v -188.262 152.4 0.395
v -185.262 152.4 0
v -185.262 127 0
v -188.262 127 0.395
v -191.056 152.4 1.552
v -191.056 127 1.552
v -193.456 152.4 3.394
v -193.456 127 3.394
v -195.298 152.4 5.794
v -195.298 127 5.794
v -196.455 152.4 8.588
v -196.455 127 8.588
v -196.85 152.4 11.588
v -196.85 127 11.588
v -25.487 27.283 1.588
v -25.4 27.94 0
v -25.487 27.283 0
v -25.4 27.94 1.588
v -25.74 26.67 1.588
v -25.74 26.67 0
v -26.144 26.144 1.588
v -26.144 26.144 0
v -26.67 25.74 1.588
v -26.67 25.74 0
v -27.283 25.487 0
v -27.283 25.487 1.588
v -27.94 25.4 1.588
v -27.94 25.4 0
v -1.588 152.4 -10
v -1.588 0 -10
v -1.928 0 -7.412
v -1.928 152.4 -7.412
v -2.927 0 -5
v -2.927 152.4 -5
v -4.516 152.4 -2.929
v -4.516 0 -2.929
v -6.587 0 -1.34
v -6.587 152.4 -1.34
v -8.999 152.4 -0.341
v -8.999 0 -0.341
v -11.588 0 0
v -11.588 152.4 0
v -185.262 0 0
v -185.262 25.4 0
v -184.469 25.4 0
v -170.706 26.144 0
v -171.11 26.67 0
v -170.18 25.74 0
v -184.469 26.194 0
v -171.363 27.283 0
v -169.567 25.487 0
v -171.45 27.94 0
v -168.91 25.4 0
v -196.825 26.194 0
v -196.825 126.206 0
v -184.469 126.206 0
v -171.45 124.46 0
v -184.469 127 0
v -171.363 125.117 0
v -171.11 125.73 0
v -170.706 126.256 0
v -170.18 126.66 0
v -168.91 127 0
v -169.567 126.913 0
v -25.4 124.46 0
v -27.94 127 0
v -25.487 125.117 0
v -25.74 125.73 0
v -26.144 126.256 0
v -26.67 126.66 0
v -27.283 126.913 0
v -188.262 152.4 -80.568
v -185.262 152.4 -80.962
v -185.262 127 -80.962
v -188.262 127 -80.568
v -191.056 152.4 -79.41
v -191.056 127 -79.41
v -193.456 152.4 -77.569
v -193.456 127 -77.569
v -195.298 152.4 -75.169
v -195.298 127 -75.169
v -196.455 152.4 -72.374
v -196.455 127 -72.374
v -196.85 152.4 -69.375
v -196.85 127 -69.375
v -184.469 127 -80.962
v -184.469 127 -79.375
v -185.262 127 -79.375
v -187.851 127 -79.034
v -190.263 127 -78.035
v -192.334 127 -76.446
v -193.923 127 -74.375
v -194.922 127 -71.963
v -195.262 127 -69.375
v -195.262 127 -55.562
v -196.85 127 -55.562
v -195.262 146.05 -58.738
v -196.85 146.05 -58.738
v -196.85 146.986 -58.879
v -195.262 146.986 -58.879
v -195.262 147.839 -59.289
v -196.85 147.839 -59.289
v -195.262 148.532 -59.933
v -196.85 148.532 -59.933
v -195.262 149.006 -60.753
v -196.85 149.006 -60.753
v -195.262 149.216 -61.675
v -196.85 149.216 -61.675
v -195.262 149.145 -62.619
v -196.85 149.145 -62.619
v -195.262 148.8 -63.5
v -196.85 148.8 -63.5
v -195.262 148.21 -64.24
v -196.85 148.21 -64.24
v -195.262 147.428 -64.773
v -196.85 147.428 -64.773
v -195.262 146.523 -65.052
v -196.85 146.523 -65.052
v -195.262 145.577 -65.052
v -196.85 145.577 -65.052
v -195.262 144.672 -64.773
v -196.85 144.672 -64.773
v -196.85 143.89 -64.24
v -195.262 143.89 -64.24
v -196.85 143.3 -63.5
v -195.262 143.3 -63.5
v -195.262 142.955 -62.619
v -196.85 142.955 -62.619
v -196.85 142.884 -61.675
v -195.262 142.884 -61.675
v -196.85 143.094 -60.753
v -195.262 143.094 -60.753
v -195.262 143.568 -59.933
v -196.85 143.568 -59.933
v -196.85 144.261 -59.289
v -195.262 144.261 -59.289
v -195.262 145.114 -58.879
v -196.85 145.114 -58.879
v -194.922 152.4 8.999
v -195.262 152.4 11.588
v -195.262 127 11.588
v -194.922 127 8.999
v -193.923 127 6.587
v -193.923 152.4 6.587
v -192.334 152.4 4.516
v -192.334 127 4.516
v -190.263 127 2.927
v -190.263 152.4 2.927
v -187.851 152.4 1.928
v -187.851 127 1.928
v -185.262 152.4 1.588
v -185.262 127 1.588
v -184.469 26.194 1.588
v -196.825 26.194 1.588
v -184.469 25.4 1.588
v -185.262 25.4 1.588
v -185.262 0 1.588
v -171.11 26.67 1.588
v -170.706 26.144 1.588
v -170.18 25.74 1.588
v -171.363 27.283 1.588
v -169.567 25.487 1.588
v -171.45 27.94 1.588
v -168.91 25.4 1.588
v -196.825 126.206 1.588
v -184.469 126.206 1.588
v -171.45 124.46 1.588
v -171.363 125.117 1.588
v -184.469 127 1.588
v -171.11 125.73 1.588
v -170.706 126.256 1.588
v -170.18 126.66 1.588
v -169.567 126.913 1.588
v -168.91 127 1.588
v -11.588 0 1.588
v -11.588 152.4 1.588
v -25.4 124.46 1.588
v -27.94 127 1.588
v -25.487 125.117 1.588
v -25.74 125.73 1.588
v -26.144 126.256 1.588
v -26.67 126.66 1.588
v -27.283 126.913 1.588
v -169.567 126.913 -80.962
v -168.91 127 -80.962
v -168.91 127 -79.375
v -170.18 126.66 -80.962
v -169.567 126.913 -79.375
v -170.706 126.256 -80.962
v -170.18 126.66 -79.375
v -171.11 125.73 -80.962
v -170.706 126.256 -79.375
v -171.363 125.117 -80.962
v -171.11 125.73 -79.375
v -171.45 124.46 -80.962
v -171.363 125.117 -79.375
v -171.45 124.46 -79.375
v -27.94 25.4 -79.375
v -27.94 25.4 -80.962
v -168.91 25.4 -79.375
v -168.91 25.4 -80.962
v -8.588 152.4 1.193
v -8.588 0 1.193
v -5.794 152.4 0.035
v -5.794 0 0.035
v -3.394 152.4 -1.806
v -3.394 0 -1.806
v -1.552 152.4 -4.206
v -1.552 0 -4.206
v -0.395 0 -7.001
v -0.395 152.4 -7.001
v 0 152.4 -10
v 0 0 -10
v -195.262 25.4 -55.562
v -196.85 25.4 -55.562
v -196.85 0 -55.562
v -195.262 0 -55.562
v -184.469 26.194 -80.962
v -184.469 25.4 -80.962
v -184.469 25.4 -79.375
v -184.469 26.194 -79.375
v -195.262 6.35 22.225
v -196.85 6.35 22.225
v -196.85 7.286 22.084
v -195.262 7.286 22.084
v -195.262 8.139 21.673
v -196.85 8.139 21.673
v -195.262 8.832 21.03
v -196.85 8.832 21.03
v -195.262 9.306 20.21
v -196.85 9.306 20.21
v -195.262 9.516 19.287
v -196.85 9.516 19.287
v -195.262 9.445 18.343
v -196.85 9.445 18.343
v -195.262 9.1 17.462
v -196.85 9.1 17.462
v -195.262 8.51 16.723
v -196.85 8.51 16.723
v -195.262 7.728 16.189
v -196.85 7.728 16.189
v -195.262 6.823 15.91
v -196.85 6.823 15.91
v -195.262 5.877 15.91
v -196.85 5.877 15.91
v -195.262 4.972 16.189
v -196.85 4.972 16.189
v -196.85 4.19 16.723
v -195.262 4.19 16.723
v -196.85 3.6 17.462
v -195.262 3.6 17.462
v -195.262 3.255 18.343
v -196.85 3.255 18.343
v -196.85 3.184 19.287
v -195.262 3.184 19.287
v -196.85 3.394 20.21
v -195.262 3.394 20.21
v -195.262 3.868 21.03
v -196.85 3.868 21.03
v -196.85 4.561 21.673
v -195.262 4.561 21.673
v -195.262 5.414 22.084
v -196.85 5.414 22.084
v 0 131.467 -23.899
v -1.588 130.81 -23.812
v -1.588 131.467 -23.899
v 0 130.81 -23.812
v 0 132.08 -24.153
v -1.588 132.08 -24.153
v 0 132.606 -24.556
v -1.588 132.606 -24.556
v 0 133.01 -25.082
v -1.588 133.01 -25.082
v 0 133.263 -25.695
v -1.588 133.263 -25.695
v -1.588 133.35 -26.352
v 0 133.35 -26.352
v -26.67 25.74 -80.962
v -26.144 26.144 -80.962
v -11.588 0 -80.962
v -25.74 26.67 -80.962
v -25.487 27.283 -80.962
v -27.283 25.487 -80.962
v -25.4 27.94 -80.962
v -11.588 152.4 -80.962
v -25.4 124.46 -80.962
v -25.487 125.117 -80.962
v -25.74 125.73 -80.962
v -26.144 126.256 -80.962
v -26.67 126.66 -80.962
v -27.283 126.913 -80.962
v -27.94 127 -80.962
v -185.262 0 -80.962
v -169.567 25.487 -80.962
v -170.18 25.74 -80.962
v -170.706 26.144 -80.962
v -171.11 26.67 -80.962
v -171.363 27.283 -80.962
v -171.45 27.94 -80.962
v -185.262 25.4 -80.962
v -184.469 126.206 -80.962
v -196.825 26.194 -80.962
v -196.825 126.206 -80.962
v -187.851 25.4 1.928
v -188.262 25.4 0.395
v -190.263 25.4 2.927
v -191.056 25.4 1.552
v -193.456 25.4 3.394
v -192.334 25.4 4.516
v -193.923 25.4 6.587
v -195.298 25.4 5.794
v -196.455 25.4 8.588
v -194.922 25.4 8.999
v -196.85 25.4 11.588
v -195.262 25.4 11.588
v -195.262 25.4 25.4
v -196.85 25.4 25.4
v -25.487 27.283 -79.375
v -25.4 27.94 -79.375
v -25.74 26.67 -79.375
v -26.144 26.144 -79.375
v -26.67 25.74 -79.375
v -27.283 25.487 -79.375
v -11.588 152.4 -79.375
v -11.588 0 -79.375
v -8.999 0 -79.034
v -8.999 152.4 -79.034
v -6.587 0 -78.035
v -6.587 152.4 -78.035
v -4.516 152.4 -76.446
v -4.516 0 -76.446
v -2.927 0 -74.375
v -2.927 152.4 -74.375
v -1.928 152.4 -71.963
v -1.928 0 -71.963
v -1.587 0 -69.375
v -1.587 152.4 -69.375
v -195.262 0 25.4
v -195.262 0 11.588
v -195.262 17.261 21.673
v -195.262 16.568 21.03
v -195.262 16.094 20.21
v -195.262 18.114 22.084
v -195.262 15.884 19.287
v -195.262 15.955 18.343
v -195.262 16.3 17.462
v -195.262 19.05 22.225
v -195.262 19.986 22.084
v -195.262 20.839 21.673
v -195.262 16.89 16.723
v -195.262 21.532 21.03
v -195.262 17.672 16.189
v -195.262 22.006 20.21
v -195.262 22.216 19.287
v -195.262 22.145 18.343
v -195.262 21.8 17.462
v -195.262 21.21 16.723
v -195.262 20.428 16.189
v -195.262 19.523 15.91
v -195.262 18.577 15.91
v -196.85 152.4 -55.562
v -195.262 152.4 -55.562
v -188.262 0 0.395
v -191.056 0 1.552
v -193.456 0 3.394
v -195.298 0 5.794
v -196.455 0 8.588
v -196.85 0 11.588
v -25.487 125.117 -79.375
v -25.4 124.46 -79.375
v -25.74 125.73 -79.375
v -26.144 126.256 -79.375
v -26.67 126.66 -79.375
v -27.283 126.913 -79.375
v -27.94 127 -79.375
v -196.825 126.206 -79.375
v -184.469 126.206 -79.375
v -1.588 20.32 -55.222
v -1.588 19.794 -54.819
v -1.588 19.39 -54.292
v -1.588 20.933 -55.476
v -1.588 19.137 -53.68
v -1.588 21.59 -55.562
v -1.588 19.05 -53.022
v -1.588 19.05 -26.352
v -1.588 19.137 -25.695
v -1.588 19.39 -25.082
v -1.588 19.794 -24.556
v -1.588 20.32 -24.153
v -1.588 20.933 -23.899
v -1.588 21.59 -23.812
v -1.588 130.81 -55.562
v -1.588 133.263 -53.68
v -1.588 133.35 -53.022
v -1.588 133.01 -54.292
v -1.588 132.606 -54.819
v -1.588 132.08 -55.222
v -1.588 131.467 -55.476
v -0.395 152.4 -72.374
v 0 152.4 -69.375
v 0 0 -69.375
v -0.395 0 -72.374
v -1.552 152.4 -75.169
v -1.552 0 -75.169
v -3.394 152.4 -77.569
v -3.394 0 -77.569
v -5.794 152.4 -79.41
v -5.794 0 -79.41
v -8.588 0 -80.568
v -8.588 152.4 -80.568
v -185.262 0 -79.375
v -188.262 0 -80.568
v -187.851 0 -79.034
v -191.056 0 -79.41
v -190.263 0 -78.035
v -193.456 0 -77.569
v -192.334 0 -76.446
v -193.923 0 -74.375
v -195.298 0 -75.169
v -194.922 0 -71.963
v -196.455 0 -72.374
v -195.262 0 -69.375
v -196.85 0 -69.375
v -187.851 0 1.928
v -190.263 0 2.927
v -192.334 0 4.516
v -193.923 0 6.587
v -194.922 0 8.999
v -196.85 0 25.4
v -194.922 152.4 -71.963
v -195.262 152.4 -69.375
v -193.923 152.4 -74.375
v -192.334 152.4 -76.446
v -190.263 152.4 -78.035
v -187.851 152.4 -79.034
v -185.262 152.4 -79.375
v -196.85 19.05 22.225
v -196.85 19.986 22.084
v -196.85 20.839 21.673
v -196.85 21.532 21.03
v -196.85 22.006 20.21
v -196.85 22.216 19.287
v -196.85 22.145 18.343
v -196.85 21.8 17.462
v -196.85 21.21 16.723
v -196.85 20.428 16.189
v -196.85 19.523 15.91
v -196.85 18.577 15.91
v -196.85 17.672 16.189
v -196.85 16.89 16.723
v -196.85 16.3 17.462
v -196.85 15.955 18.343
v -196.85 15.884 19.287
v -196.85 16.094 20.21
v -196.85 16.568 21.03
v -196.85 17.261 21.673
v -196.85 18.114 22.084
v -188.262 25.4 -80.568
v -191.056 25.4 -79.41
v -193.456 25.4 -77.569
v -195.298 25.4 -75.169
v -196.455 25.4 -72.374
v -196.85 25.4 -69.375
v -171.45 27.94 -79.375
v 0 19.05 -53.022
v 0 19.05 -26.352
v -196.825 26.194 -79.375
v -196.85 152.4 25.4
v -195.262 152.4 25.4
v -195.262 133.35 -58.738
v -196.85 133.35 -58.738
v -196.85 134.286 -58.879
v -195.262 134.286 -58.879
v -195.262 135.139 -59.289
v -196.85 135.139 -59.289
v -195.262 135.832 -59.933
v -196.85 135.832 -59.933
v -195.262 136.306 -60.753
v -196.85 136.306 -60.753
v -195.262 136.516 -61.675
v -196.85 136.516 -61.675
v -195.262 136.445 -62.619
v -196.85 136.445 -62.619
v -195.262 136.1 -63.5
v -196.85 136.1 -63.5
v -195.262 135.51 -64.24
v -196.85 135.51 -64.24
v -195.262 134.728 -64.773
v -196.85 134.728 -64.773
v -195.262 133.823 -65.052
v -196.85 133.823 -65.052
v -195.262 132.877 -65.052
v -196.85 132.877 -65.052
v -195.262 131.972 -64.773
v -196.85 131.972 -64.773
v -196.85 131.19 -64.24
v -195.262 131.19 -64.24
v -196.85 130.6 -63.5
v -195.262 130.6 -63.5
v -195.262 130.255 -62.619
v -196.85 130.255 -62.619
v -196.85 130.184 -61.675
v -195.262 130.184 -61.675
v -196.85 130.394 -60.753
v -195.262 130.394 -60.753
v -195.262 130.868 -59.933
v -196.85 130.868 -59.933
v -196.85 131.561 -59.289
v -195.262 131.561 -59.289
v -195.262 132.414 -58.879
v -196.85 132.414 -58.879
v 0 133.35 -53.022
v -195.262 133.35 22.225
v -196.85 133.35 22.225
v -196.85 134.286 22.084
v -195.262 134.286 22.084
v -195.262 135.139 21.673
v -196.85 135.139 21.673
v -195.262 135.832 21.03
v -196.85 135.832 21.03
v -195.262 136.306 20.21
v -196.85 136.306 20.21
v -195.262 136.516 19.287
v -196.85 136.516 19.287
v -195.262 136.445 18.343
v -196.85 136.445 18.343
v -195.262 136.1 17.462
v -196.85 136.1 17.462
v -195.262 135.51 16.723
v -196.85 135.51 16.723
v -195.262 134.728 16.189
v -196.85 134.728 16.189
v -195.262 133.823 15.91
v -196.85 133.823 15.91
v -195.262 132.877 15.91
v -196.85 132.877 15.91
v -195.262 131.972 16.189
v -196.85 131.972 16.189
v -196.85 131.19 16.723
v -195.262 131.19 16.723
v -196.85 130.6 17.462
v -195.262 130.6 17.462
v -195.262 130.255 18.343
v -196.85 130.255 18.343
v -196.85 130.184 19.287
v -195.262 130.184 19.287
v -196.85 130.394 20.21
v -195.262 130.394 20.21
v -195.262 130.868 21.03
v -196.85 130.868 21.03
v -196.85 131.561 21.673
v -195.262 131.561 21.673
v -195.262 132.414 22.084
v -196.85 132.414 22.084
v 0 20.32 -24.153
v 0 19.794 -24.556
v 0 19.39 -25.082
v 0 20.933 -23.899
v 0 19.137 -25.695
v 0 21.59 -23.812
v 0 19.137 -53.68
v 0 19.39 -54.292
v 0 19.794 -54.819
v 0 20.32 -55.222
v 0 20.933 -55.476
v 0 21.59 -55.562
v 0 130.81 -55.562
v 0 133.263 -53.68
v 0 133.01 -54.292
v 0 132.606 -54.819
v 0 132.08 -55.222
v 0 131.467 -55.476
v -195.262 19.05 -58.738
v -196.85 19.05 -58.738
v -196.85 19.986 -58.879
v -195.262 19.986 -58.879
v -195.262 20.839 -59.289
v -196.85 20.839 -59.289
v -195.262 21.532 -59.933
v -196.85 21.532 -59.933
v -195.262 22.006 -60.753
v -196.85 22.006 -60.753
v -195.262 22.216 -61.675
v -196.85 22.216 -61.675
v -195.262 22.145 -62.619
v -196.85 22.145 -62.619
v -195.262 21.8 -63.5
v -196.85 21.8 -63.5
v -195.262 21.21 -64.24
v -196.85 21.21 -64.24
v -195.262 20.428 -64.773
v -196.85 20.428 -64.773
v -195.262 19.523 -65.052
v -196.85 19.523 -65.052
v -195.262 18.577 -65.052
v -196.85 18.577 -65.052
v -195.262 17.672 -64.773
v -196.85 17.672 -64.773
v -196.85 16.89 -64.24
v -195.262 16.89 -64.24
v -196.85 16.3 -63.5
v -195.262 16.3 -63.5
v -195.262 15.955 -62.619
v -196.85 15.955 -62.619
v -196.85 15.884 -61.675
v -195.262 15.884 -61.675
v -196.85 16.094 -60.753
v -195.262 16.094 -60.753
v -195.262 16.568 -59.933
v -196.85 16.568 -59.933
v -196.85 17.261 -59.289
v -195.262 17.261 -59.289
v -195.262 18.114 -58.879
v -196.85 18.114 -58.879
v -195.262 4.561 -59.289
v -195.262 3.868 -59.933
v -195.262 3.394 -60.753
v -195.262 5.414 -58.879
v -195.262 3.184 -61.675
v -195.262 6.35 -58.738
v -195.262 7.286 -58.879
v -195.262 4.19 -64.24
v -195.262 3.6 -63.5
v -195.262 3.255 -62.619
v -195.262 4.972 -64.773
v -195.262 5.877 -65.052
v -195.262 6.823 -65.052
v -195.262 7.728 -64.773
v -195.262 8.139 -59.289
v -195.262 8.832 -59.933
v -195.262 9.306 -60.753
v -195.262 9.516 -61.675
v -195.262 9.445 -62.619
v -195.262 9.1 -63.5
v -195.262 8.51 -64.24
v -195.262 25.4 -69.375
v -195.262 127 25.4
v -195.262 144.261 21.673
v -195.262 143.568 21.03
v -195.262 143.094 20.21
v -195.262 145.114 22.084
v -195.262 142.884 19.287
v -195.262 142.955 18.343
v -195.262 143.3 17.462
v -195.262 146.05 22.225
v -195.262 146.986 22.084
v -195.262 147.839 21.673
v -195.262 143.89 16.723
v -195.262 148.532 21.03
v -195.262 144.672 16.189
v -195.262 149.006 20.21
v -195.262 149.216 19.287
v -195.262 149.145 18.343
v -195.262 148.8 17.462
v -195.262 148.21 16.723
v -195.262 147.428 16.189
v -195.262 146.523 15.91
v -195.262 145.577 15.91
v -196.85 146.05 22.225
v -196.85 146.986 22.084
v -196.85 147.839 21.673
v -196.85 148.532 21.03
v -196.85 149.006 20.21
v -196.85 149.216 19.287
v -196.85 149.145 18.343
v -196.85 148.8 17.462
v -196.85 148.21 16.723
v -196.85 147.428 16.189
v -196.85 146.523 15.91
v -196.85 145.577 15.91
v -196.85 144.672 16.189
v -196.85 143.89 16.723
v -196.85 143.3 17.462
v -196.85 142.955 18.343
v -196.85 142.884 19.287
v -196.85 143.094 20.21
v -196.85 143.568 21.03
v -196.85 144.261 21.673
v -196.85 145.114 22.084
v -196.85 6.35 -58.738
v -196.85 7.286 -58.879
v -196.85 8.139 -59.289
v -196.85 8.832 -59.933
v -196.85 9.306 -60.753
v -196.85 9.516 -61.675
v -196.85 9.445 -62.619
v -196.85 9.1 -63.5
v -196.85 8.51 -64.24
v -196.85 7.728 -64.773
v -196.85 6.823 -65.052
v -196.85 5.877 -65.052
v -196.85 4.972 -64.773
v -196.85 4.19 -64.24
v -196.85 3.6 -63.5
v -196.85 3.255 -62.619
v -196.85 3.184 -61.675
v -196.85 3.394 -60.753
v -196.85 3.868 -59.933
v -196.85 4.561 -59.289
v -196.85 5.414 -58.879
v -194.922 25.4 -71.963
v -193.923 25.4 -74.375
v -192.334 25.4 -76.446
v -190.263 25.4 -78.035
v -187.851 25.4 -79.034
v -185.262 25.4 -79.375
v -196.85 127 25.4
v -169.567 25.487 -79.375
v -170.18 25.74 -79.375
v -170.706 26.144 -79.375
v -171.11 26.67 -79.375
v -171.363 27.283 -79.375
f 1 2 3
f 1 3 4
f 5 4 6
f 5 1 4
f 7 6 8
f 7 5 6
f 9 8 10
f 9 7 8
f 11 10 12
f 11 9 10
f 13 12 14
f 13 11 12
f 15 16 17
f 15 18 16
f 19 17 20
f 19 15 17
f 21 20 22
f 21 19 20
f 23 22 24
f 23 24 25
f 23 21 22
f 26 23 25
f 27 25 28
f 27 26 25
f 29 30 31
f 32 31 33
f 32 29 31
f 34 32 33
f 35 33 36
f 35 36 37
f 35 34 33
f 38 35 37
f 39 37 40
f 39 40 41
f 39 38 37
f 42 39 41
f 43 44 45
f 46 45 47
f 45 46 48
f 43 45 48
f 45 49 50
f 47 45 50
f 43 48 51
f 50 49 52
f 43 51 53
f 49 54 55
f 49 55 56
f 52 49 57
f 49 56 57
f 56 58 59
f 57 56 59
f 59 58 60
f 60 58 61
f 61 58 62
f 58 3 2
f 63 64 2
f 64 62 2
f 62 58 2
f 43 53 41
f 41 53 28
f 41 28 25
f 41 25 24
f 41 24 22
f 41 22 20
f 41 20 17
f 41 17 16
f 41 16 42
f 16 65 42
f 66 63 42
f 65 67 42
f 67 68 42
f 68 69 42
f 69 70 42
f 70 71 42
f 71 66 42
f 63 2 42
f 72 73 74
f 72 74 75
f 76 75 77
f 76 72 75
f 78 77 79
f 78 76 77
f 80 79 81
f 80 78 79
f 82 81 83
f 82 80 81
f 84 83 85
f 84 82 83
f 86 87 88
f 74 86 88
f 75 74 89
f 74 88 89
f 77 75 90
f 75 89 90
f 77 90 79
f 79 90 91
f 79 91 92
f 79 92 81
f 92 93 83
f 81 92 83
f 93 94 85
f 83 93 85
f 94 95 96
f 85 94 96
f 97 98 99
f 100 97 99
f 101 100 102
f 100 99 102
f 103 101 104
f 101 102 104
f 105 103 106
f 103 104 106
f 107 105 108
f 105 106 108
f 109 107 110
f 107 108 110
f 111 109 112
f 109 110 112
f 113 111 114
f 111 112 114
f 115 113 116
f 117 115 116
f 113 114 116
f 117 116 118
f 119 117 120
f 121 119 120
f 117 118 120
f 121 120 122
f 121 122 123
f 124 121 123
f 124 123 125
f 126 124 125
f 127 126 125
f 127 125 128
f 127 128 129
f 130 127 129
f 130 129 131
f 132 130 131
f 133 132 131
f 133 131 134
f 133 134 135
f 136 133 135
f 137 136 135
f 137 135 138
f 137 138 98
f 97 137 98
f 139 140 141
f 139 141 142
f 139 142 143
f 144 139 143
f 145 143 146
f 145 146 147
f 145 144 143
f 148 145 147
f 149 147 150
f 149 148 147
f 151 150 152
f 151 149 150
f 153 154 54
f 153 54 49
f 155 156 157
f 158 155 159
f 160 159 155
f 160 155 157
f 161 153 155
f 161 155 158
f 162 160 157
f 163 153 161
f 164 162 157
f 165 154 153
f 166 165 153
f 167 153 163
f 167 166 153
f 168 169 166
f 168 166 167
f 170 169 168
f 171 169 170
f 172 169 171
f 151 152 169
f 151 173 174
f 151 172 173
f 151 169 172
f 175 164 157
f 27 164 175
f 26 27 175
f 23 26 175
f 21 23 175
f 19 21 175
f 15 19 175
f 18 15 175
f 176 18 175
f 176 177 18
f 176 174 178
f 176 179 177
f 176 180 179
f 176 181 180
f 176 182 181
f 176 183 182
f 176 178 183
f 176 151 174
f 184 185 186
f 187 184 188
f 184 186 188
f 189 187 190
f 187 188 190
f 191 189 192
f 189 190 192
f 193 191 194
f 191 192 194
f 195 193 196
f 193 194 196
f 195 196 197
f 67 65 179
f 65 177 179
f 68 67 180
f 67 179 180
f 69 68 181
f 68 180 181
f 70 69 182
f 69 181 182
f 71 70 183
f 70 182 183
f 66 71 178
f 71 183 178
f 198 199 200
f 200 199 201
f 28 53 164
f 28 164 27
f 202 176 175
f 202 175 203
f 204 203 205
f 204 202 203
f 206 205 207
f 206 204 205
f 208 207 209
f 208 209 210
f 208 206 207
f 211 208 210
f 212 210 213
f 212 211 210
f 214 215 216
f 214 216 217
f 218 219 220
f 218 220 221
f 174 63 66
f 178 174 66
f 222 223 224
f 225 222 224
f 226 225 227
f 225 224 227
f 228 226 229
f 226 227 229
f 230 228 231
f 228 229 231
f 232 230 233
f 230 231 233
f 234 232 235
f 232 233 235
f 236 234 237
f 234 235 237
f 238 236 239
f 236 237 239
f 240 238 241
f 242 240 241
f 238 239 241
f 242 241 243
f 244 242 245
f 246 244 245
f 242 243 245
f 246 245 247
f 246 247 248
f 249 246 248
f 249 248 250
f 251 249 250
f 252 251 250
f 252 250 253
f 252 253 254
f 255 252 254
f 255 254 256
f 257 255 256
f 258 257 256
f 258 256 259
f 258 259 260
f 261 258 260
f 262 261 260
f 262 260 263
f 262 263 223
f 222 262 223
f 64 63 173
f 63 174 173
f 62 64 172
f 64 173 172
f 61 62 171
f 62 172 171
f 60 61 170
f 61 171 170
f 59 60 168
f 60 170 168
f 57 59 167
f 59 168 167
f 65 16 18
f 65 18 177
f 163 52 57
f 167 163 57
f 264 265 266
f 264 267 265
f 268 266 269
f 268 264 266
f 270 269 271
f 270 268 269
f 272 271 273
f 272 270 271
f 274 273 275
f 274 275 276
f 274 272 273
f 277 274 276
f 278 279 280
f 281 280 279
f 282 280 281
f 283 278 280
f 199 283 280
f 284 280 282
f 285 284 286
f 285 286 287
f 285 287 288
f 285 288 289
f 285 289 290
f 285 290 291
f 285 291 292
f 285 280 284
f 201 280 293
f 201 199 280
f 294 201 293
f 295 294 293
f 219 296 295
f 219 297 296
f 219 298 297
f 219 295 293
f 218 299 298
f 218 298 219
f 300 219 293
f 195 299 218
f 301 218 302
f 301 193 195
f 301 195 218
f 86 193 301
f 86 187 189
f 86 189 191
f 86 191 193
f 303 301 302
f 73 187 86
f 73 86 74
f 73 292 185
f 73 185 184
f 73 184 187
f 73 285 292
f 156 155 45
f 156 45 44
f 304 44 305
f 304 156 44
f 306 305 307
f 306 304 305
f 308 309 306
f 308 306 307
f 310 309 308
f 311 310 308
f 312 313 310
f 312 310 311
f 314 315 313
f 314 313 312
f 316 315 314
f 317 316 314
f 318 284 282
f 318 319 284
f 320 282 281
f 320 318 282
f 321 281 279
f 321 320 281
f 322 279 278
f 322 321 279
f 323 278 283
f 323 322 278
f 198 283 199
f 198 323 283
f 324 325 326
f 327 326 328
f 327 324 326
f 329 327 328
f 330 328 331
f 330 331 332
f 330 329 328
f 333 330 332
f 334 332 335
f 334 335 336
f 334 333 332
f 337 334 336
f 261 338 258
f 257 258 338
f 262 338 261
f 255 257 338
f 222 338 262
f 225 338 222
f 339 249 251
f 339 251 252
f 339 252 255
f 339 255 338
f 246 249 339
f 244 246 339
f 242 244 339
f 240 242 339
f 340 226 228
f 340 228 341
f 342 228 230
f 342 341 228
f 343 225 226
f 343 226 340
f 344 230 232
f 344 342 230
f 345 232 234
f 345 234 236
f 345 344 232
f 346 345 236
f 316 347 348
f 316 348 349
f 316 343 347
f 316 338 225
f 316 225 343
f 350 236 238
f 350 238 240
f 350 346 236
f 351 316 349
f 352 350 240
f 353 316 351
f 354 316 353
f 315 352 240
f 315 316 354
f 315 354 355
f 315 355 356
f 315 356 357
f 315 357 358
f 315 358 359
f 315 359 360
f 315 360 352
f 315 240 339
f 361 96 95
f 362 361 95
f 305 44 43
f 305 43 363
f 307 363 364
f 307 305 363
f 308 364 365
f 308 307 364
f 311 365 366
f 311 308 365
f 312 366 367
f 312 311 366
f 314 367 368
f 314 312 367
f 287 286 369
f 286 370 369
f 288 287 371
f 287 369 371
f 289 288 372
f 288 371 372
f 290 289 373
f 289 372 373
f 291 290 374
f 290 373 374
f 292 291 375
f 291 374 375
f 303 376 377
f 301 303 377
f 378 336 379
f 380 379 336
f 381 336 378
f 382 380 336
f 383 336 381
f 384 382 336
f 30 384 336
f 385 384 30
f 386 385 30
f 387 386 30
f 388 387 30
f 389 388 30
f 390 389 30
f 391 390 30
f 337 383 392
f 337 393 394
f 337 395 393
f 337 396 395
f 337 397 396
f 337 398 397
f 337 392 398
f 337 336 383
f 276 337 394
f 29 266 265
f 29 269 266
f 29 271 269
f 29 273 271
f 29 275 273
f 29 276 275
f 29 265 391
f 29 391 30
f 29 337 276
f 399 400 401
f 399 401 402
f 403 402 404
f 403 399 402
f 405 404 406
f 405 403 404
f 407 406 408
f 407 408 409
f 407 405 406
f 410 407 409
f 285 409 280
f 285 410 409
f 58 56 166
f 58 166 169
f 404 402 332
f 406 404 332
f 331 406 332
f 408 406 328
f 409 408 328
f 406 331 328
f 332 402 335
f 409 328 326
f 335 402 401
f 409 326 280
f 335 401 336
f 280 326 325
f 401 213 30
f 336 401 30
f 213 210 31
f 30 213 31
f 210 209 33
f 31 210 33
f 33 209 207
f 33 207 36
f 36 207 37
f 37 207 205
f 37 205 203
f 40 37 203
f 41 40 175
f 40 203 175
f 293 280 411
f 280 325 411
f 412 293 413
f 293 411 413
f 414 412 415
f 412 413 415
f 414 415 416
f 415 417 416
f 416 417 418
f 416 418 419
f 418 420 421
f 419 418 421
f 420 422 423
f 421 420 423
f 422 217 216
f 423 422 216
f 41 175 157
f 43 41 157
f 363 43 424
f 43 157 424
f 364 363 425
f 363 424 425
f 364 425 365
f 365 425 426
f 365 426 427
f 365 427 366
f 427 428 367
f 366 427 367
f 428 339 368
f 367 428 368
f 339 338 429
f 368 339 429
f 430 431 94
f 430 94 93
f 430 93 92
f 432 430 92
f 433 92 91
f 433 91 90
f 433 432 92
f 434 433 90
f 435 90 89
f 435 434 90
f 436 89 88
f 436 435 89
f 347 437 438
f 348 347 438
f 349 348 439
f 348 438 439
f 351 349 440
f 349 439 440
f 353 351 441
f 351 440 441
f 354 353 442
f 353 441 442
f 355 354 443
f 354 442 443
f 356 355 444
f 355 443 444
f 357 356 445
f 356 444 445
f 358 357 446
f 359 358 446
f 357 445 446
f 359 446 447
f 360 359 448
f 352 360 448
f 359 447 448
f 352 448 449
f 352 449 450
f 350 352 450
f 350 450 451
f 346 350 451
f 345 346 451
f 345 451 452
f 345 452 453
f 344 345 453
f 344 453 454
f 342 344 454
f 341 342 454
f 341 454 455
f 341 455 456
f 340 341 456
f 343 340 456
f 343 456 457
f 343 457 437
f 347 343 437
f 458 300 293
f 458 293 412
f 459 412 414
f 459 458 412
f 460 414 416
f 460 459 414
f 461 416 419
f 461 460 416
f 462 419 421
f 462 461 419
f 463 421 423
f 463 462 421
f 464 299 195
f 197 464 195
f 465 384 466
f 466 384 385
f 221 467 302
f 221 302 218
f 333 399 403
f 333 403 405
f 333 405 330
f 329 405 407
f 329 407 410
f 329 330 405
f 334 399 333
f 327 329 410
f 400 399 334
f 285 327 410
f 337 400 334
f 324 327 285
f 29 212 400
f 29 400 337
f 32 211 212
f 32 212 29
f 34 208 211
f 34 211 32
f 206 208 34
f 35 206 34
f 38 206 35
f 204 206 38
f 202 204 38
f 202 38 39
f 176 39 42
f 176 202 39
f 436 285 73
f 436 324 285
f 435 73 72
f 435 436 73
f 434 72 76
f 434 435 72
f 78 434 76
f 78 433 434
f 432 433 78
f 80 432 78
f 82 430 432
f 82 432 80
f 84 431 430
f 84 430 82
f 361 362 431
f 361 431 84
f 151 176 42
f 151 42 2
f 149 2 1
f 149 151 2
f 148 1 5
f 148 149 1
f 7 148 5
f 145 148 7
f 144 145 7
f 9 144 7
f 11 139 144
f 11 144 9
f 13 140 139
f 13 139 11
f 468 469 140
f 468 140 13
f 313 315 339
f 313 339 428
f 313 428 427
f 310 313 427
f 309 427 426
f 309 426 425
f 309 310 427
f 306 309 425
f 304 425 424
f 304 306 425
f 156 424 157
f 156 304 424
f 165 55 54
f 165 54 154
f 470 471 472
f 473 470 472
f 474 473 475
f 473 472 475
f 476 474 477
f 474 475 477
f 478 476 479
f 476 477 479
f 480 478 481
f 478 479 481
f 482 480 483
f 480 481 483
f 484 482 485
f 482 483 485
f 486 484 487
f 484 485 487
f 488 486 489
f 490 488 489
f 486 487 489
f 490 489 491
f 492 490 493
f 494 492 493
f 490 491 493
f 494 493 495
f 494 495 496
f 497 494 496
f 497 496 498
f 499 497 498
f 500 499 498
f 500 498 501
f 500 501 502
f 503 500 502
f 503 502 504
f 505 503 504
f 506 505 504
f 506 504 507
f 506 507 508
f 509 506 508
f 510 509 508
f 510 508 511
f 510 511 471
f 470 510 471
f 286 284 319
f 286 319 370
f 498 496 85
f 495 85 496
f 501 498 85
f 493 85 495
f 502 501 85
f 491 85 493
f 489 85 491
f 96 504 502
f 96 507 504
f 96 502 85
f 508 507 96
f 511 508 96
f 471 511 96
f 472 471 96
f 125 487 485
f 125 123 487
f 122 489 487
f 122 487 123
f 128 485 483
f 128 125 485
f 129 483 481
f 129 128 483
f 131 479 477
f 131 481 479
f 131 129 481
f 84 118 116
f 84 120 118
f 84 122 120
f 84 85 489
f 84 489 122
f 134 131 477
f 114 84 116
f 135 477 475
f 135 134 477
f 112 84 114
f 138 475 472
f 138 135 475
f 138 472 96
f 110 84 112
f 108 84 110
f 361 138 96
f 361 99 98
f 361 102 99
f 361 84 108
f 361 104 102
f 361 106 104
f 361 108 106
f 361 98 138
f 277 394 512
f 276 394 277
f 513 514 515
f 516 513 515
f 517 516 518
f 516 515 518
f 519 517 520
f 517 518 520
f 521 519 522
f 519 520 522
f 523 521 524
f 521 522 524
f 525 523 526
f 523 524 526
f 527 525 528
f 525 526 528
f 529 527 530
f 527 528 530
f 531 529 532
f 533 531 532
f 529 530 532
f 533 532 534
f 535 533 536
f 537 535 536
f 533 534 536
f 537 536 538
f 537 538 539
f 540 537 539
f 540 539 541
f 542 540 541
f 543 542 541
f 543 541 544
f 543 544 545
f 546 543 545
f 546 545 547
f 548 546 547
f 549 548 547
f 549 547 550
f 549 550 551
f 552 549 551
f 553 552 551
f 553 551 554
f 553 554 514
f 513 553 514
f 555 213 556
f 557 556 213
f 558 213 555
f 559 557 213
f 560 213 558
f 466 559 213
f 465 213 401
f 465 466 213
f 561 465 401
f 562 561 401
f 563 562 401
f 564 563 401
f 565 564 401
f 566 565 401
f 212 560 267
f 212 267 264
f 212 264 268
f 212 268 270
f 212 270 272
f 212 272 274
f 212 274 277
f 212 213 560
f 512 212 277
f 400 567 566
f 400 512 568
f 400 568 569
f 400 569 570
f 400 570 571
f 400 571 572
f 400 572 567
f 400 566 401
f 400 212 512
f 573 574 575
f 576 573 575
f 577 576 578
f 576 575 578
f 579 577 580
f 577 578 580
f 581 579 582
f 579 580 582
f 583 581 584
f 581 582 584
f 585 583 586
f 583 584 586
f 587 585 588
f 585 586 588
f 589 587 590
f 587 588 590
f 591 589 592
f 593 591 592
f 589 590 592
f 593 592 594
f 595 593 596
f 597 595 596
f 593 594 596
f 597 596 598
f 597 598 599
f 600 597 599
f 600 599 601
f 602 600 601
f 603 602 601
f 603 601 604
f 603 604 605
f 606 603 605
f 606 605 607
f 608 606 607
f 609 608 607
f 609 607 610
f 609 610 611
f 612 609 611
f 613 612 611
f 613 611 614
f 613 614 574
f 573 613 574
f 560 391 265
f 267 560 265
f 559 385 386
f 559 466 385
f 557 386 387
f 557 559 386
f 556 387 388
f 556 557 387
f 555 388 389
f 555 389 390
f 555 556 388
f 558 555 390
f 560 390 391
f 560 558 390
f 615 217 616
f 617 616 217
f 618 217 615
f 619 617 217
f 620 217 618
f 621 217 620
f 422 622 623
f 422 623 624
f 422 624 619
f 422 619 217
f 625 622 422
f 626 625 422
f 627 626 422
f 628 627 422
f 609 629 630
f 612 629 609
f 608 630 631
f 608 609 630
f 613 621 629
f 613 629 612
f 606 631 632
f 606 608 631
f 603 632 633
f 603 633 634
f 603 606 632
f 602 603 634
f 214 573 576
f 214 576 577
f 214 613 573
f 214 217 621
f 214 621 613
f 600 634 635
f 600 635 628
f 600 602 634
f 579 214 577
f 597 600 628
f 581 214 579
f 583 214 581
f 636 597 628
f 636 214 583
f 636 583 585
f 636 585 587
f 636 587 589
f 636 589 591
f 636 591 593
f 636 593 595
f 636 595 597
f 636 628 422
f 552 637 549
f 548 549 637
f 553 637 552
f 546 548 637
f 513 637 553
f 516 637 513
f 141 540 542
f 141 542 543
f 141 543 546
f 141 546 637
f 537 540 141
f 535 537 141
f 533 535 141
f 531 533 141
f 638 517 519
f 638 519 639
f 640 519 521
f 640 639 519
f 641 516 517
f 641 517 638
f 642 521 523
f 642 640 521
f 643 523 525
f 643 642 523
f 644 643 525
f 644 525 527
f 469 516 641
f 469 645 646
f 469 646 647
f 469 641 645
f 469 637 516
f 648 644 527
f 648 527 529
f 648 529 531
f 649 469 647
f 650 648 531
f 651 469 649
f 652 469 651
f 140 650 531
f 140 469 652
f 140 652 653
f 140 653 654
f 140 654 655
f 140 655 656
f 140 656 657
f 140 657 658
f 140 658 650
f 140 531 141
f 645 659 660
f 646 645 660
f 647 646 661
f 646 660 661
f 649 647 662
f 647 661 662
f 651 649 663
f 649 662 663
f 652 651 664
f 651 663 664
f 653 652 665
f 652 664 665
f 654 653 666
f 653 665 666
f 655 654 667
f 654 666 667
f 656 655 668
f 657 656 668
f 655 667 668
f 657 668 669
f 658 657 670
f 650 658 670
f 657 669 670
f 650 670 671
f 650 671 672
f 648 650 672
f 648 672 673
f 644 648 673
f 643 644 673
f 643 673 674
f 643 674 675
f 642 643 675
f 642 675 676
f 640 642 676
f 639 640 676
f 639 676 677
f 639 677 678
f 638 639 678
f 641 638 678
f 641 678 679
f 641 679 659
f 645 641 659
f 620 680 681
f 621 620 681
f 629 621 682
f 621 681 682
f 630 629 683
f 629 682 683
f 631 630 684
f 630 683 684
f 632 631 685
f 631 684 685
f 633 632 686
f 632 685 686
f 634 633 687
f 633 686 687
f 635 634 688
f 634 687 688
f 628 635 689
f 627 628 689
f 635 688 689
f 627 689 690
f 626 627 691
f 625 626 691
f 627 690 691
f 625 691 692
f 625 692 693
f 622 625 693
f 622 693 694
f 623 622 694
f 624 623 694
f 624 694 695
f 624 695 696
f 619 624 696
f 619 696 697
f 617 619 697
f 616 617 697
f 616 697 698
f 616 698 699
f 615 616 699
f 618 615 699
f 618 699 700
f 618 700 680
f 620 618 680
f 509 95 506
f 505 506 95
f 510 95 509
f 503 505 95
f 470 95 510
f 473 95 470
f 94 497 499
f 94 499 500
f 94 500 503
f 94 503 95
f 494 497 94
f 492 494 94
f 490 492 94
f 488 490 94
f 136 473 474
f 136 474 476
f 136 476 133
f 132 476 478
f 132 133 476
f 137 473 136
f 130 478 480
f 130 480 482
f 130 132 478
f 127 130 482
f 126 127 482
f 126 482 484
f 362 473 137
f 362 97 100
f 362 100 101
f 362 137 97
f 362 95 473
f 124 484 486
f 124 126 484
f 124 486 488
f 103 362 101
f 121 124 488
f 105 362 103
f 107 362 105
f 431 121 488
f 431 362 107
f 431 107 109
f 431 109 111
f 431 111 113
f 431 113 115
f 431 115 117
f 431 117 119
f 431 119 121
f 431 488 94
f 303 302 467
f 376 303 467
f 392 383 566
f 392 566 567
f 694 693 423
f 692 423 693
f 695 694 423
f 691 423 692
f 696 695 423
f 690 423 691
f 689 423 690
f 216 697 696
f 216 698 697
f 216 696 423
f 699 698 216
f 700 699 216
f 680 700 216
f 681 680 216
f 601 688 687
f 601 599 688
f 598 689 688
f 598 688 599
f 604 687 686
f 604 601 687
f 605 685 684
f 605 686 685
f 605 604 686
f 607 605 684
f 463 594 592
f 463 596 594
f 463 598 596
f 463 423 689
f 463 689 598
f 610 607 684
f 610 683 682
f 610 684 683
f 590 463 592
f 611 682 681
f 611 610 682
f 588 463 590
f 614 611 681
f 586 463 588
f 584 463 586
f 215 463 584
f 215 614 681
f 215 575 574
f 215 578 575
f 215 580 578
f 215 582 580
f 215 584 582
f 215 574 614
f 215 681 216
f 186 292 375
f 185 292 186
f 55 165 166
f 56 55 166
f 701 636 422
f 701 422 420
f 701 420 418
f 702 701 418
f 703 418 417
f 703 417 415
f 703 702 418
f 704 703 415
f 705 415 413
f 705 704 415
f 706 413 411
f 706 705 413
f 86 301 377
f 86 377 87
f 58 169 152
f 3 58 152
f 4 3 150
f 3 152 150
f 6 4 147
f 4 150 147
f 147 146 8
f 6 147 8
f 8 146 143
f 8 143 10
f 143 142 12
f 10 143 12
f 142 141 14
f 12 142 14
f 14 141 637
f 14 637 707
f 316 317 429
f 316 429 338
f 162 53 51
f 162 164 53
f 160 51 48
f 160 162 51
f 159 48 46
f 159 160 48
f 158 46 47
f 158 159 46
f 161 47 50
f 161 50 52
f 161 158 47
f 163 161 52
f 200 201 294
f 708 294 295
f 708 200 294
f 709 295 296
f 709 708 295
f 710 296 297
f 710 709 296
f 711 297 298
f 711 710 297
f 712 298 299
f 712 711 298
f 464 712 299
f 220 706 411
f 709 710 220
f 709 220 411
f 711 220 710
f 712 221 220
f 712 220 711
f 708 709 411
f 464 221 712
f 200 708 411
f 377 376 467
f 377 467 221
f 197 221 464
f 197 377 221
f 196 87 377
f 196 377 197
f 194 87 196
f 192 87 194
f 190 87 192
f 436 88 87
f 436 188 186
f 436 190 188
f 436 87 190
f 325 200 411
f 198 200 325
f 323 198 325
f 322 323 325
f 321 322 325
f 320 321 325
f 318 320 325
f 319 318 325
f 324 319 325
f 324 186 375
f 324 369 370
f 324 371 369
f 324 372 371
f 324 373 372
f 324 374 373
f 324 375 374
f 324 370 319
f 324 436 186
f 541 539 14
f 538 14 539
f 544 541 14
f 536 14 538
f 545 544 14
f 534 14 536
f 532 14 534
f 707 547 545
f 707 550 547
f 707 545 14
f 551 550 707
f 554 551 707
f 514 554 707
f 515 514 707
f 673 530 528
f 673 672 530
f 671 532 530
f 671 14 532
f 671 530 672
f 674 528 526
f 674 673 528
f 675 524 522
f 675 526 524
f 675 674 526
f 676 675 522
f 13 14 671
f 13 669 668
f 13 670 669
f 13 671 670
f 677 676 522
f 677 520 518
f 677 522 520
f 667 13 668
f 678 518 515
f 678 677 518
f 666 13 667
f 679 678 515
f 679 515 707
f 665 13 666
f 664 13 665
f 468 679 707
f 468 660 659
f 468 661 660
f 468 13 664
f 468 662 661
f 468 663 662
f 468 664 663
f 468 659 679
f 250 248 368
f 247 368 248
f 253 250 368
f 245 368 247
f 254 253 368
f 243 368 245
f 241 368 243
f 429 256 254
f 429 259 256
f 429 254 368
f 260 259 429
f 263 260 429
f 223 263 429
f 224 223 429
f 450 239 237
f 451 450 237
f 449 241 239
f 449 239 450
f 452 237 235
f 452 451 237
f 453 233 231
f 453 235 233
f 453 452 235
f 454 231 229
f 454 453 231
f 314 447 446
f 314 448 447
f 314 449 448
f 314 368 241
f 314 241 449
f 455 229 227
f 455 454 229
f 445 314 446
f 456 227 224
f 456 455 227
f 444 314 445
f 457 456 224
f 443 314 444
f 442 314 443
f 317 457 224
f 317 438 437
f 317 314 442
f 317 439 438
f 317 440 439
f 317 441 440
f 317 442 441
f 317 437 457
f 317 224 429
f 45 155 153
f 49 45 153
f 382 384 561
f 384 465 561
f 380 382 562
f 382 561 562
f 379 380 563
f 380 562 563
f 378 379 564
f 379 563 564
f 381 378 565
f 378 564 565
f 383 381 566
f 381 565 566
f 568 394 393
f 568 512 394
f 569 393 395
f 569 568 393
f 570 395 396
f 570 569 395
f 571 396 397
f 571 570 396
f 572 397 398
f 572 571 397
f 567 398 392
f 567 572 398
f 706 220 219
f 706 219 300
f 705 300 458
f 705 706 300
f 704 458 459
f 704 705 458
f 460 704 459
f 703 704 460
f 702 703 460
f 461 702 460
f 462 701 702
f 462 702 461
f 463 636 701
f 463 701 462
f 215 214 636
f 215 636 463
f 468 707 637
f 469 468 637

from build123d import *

# Parameters (mm, degrees)
SKETCH1_W                     = 196.85
SKETCH1_H                     = 152.4
SKETCH1_W_2                   = 146.05
SKETCH1_H_2                   = 101.6
BOSS_EXTRUDE1_DEPTH           = 1.5875
EDGE_FLANGE1_STRIP_W          = 26.35
EDGE_FLANGE1_STRIP_H          = 1.5875
EDGE_FLANGE1_STRIP_CUT_DEPTH  = 152.4
EDGE_FLANGE1_DEPTH            = 152.4
EDGE_FLANGE2_STRIP_W          = 26.35
EDGE_FLANGE2_STRIP_H          = 1.5875
EDGE_FLANGE2_STRIP_CUT_DEPTH  = 152.4
EDGE_FLANGE2_DEPTH            = 152.4
SKETCH16_W                    = 146.05
SKETCH16_H                    = 101.6
CUT_EXTRUDE1_DEPTH            = 1.5875
SKETCH17_W                    = 31.75
SKETCH17_H                    = 114.3
CUT_EXTRUDE2_DEPTH            = 1.5875
SKETCH25_W                    = 1.5875
SKETCH25_H                    = 101.6
CUT_EXTRUDE3_DEPTH            = 0.0254
EDGE_FLANGE5_STRIP_W          = 26.35
EDGE_FLANGE5_STRIP_H          = 1.5875
EDGE_FLANGE5_STRIP_CUT_DEPTH  = 25.4
EDGE_FLANGE5_RELIEF_W         = 27.14375
EDGE_FLANGE5_RELIEF_H         = 0.79375
EDGE_FLANGE5_RELIEF_CUT_DEPTH = 1.5875
EDGE_FLANGE5_DEPTH            = 25.4
EDGE_FLANGE6_STRIP_W          = 26.35
EDGE_FLANGE6_STRIP_H          = 1.5875
EDGE_FLANGE6_STRIP_CUT_DEPTH  = 25.4
EDGE_FLANGE6_RELIEF_W         = 27.14375
EDGE_FLANGE6_RELIEF_H         = 0.79375
EDGE_FLANGE6_RELIEF_CUT_DEPTH = 1.5875
EDGE_FLANGE6_DEPTH            = 25.4
SKETCH32_R                    = 3.175
CUT_EXTRUDE4_DEPTH            = 10.16
SKETCH33_R                    = 3.175
CUT_EXTRUDE5_DEPTH            = 10.16
FILLET1_R                     = 2.54
FILLET2_R                     = 2.54
FILLET3_R                     = 2.54
SKETCH35_W                    = 1.5875
SKETCH35_H                    = 101.6
CUT_EXTRUDE6_DEPTH            = 0.0254
EDGE_FLANGE7_STRIP_W          = 26.35
EDGE_FLANGE7_STRIP_H          = 1.5875
EDGE_FLANGE7_STRIP_CUT_DEPTH  = 25.4
EDGE_FLANGE7_RELIEF_W         = 27.14375
EDGE_FLANGE7_RELIEF_H         = 0.79375
EDGE_FLANGE7_RELIEF_CUT_DEPTH = 1.5875
EDGE_FLANGE7_DEPTH            = 25.4
EDGE_FLANGE8_STRIP_W          = 26.35
EDGE_FLANGE8_STRIP_H          = 1.5875
EDGE_FLANGE8_STRIP_CUT_DEPTH  = 25.4
EDGE_FLANGE8_RELIEF_W         = 27.14375
EDGE_FLANGE8_RELIEF_H         = 0.79375
EDGE_FLANGE8_RELIEF_CUT_DEPTH = 1.5875
EDGE_FLANGE8_DEPTH            = 25.4
SKETCH42_R                    = 3.175
CUT_EXTRUDE7_DEPTH            = 10.16
SKETCH43_R                    = 3.175
CUT_EXTRUDE8_DEPTH            = 10.16


# Sheet-metal steps are written as plain solids
with BuildPart() as part:
    # Sketch1 → Boss-Extrude1 (new body)
    with BuildSketch(Plane.XY):
        with Locations((-98.425, 76.2)):
            Rectangle(SKETCH1_W, SKETCH1_H)
        with Locations((-98.425, 76.2)):
            Rectangle(SKETCH1_W_2, SKETCH1_H_2, mode=Mode.SUBTRACT)
    extrude(amount=BOSS_EXTRUDE1_DEPTH)

    # Edge-Flange1 strip (across the edge) → Edge-Flange1 strip cut (cut)
    with BuildSketch(Plane(origin=(0, 152.4, 0), x_dir=(-1, 0, 0), z_dir=(0, -1, 0))):
        with Locations((-1.5875, -0.79375)):
            Rectangle(EDGE_FLANGE1_STRIP_W, EDGE_FLANGE1_STRIP_H)
    extrude(amount=EDGE_FLANGE1_STRIP_CUT_DEPTH, mode=Mode.SUBTRACT)

    # Edge-Flange1 section (across the edge) → Edge-Flange1 (add)
    with BuildSketch(Plane(origin=(0, 152.4, 0), x_dir=(-1, 0, 0), z_dir=(0, -1, 0))):
        with BuildLine():
            Line((0, 10), (0, 80.9625))
            Line((0, 80.9625), (1.5875, 80.9625))
            Line((1.5875, 80.9625), (1.5875, 10))
            ThreePointArc((1.5875, 10), (4.516432188, 2.928932188), (11.5875, 0))
            Line((11.5875, 0), (11.5875, -1.5875))
            ThreePointArc((11.5875, -1.5875), (3.393900173, 1.806400173), (0, 10))
        make_face()
    extrude(amount=EDGE_FLANGE1_DEPTH)

    # Edge-Flange2 strip (across the edge) → Edge-Flange2 strip cut (cut)
    with BuildSketch(Plane(origin=(-1.5875, 152.4, -80.9625), x_dir=(0, 0, 1), z_dir=(0, -1, 0))):
        with Locations((-1.5875, -0.79375)):
            Rectangle(EDGE_FLANGE2_STRIP_W, EDGE_FLANGE2_STRIP_H)
    extrude(amount=EDGE_FLANGE2_STRIP_CUT_DEPTH, mode=Mode.SUBTRACT)

    # Edge-Flange2 section (across the edge) → Edge-Flange2 (add)
    with BuildSketch(Plane(origin=(-1.5875, 152.4, -80.9625), x_dir=(0, 0, 1), z_dir=(0, -1, 0))):
        with BuildLine():
            Line((0, 10), (0, 195.2625))
            Line((0, 195.2625), (1.5875, 195.2625))
            Line((1.5875, 195.2625), (1.5875, 10))
            ThreePointArc((1.5875, 10), (4.516432188, 2.928932188), (11.5875, 0))
            Line((11.5875, 0), (11.5875, -1.5875))
            ThreePointArc((11.5875, -1.5875), (3.393900173, 1.806400173), (0, 10))
        make_face()
    extrude(amount=EDGE_FLANGE2_DEPTH)

    # Sketch16 → Cut-Extrude1 (cut)
    with BuildSketch(Plane(origin=(0, 0, -80.9625), x_dir=(-1, 0, 0), z_dir=(0, 0, -1))):
        with Locations((98.425, 76.2)):
            Rectangle(SKETCH16_W, SKETCH16_H)
    extrude(amount=-CUT_EXTRUDE1_DEPTH, mode=Mode.SUBTRACT)

    # Sketch17 → Cut-Extrude2 (cut)
    with BuildSketch(Plane.ZY.offset(1.5875)):
        with Locations((-39.6875, 76.2)):
            Rectangle(SKETCH17_W, SKETCH17_H)
    extrude(amount=-CUT_EXTRUDE2_DEPTH, mode=Mode.SUBTRACT)

    # Sketch25 → Cut-Extrude3 (cut)
    with BuildSketch(Plane.ZY.offset(196.85)):
        with Locations((-80.16875, 76.2)):
            Rectangle(SKETCH25_W, SKETCH25_H)
    extrude(amount=-CUT_EXTRUDE3_DEPTH, mode=Mode.SUBTRACT)

    # Edge-Flange5 strip (across the edge) → Edge-Flange5 strip cut (cut)
    with BuildSketch(Plane(origin=(-196.85, 152.4, -79.375), x_dir=(1, 0, 0), z_dir=(0, -1, 0))):
        with Locations((-1.5875, -0.79375)):
            Rectangle(EDGE_FLANGE5_STRIP_W, EDGE_FLANGE5_STRIP_H)
    extrude(amount=EDGE_FLANGE5_STRIP_CUT_DEPTH, mode=Mode.SUBTRACT)

    # Edge-Flange5 relief (on the sheet) → Edge-Flange5 relief cut (cut)
    with BuildSketch(Plane(origin=(-185.2625, 152.4, -79.375), x_dir=(1, 0, 0), z_dir=(0, 0, 1))):
        with Locations((-12.778125, -25.796875)):
            Rectangle(EDGE_FLANGE5_RELIEF_W, EDGE_FLANGE5_RELIEF_H)
    extrude(amount=-EDGE_FLANGE5_RELIEF_CUT_DEPTH, mode=Mode.SUBTRACT)

    # Edge-Flange5 section (across the edge) → Edge-Flange5 (add)
    with BuildSketch(Plane(origin=(-196.85, 152.4, -79.375), x_dir=(1, 0, 0), z_dir=(0, -1, 0))):
        with BuildLine():
            Line((0, 10), (0, 23.8125))
            Line((0, 23.8125), (1.5875, 23.8125))
            Line((1.5875, 23.8125), (1.5875, 10))
            ThreePointArc((1.5875, 10), (4.516432188, 2.928932188), (11.5875, 0))
            Line((11.5875, 0), (11.5875, -1.5875))
            ThreePointArc((11.5875, -1.5875), (3.393900173, 1.806400173), (0, 10))
        make_face()
    extrude(amount=EDGE_FLANGE5_DEPTH)

    # Edge-Flange6 strip (across the edge) → Edge-Flange6 strip cut (cut)
    with BuildSketch(Plane(origin=(-196.85, 25.4, -79.375), x_dir=(1, 0, 0), z_dir=(0, -1, 0))):
        with Locations((-1.5875, -0.79375)):
            Rectangle(EDGE_FLANGE6_STRIP_W, EDGE_FLANGE6_STRIP_H)
    extrude(amount=EDGE_FLANGE6_STRIP_CUT_DEPTH, mode=Mode.SUBTRACT)

    # Edge-Flange6 relief (on the sheet) → Edge-Flange6 relief cut (cut)
    with BuildSketch(Plane(origin=(-185.2625, 25.4, -79.375), x_dir=(1, 0, 0), z_dir=(0, 0, 1))):
        with Locations((-12.778125, 0.396875)):
            Rectangle(EDGE_FLANGE6_RELIEF_W, EDGE_FLANGE6_RELIEF_H)
    extrude(amount=-EDGE_FLANGE6_RELIEF_CUT_DEPTH, mode=Mode.SUBTRACT)

    # Edge-Flange6 section (across the edge) → Edge-Flange6 (add)
    with BuildSketch(Plane(origin=(-196.85, 25.4, -79.375), x_dir=(1, 0, 0), z_dir=(0, -1, 0))):
        with BuildLine():
            Line((0, 10), (0, 23.8125))
            Line((0, 23.8125), (1.5875, 23.8125))
            Line((1.5875, 23.8125), (1.5875, 10))
            ThreePointArc((1.5875, 10), (4.516432188, 2.928932188), (11.5875, 0))
            Line((11.5875, 0), (11.5875, -1.5875))
            ThreePointArc((11.5875, -1.5875), (3.393900173, 1.806400173), (0, 10))
        make_face()
    extrude(amount=EDGE_FLANGE6_DEPTH)

    # Sketch32 → Cut-Extrude4 (cut)
    with BuildSketch(Plane.ZY.offset(196.85)):
        with Locations((-61.9125, 146.05)):
            Circle(SKETCH32_R)
        with Locations((-61.9125, 133.35)):
            Circle(SKETCH32_R)
    extrude(amount=-CUT_EXTRUDE4_DEPTH, mode=Mode.SUBTRACT)

    # Sketch33 → Cut-Extrude5 (cut)
    with BuildSketch(Plane.ZY.offset(196.85)):
        with Locations((-61.9125, 19.05)):
            Circle(SKETCH33_R)
        with Locations((-61.9125, 6.35)):
            Circle(SKETCH33_R)
    extrude(amount=-CUT_EXTRUDE5_DEPTH, mode=Mode.SUBTRACT)

    # Fillet1
    fillet1_edges = [part.edges().sort_by_distance(p)[0] for p in [
        (-25.4, 127, 0.79375),
    ]]
    fillet(fillet1_edges, radius=FILLET1_R)

    # Fillet2
    fillet2_edges = [part.edges().sort_by_distance(p)[0] for p in [
        (-171.45, 25.4, 0.79375),
        (-25.4, 25.4, 0.79375),
        (-171.45, 127, 0.79375),
        (-25.4, 25.4, -80.16875),
        (-25.4, 127, -80.16875),
        (-171.45, 127, -80.16875),
    ]]
    fillet(fillet2_edges, radius=FILLET2_R)

    # Fillet3
    fillet3_edges = [part.edges().sort_by_distance(p)[0] for p in [
        (-0.79375, 19.05, -55.5625),
        (-0.79375, 133.35, -55.5625),
        (-0.79375, 133.35, -23.8125),
        (-0.79375, 19.05, -23.8125),
        (-171.45, 25.4, -80.16875),
    ]]
    fillet(fillet3_edges, radius=FILLET3_R)

    # Sketch35 → Cut-Extrude6 (cut)
    with BuildSketch(Plane.ZY.offset(196.85)):
        with Locations((0.79375, 76.2)):
            Rectangle(SKETCH35_W, SKETCH35_H)
    extrude(amount=-CUT_EXTRUDE6_DEPTH, mode=Mode.SUBTRACT)

    # Edge-Flange7 strip (across the edge) → Edge-Flange7 strip cut (cut)
    with BuildSketch(Plane(origin=(-196.85, 152.4, 1.5875), x_dir=(1, 0, 0), z_dir=(0, -1, 0))):
        with Locations((-1.5875, -0.79375)):
            Rectangle(EDGE_FLANGE7_STRIP_W, EDGE_FLANGE7_STRIP_H)
    extrude(amount=EDGE_FLANGE7_STRIP_CUT_DEPTH, mode=Mode.SUBTRACT)

    # Edge-Flange7 relief (on the sheet) → Edge-Flange7 relief cut (cut)
    with BuildSketch(Plane(origin=(-185.2625, 152.4, 1.5875), x_dir=(1, 0, 0), z_dir=(0, 0, 1))):
        with Locations((-12.778125, -25.796875)):
            Rectangle(EDGE_FLANGE7_RELIEF_W, EDGE_FLANGE7_RELIEF_H)
    extrude(amount=-EDGE_FLANGE7_RELIEF_CUT_DEPTH, mode=Mode.SUBTRACT)

    # Edge-Flange7 section (across the edge) → Edge-Flange7 (add)
    with BuildSketch(Plane(origin=(-196.85, 152.4, 1.5875), x_dir=(1, 0, 0), z_dir=(0, -1, 0))):
        with BuildLine():
            Line((0, 10), (0, 23.8125))
            Line((0, 23.8125), (1.5875, 23.8125))
            Line((1.5875, 23.8125), (1.5875, 10))
            ThreePointArc((1.5875, 10), (4.516432188, 2.928932188), (11.5875, 0))
            Line((11.5875, 0), (11.5875, -1.5875))
            ThreePointArc((11.5875, -1.5875), (3.393900173, 1.806400173), (0, 10))
        make_face()
    extrude(amount=EDGE_FLANGE7_DEPTH)

    # Edge-Flange8 strip (across the edge) → Edge-Flange8 strip cut (cut)
    with BuildSketch(Plane(origin=(-196.85, 25.4, 1.5875), x_dir=(1, 0, 0), z_dir=(0, -1, 0))):
        with Locations((-1.5875, -0.79375)):
            Rectangle(EDGE_FLANGE8_STRIP_W, EDGE_FLANGE8_STRIP_H)
    extrude(amount=EDGE_FLANGE8_STRIP_CUT_DEPTH, mode=Mode.SUBTRACT)

    # Edge-Flange8 relief (on the sheet) → Edge-Flange8 relief cut (cut)
    with BuildSketch(Plane(origin=(-185.2625, 25.4, 1.5875), x_dir=(1, 0, 0), z_dir=(0, 0, 1))):
        with Locations((-12.778125, 0.396875)):
            Rectangle(EDGE_FLANGE8_RELIEF_W, EDGE_FLANGE8_RELIEF_H)
    extrude(amount=-EDGE_FLANGE8_RELIEF_CUT_DEPTH, mode=Mode.SUBTRACT)

    # Edge-Flange8 section (across the edge) → Edge-Flange8 (add)
    with BuildSketch(Plane(origin=(-196.85, 25.4, 1.5875), x_dir=(1, 0, 0), z_dir=(0, -1, 0))):
        with BuildLine():
            Line((0, 10), (0, 23.8125))
            Line((0, 23.8125), (1.5875, 23.8125))
            Line((1.5875, 23.8125), (1.5875, 10))
            ThreePointArc((1.5875, 10), (4.516432188, 2.928932188), (11.5875, 0))
            Line((11.5875, 0), (11.5875, -1.5875))
            ThreePointArc((11.5875, -1.5875), (3.393900173, 1.806400173), (0, 10))
        make_face()
    extrude(amount=EDGE_FLANGE8_DEPTH)

    # Sketch42 → Cut-Extrude7 (cut)
    with BuildSketch(Plane.ZY.offset(196.85)):
        with Locations((19.05, 146.05)):
            Circle(SKETCH42_R)
        with Locations((19.05, 133.35)):
            Circle(SKETCH42_R)
    extrude(amount=-CUT_EXTRUDE7_DEPTH, mode=Mode.SUBTRACT)

    # Sketch43 → Cut-Extrude8 (cut)
    with BuildSketch(Plane.ZY.offset(196.85)):
        with Locations((19.05, 19.05)):
            Circle(SKETCH43_R)
        with Locations((19.05, 6.35)):
            Circle(SKETCH43_R)
    extrude(amount=-CUT_EXTRUDE8_DEPTH, mode=Mode.SUBTRACT)


solid = part.part
